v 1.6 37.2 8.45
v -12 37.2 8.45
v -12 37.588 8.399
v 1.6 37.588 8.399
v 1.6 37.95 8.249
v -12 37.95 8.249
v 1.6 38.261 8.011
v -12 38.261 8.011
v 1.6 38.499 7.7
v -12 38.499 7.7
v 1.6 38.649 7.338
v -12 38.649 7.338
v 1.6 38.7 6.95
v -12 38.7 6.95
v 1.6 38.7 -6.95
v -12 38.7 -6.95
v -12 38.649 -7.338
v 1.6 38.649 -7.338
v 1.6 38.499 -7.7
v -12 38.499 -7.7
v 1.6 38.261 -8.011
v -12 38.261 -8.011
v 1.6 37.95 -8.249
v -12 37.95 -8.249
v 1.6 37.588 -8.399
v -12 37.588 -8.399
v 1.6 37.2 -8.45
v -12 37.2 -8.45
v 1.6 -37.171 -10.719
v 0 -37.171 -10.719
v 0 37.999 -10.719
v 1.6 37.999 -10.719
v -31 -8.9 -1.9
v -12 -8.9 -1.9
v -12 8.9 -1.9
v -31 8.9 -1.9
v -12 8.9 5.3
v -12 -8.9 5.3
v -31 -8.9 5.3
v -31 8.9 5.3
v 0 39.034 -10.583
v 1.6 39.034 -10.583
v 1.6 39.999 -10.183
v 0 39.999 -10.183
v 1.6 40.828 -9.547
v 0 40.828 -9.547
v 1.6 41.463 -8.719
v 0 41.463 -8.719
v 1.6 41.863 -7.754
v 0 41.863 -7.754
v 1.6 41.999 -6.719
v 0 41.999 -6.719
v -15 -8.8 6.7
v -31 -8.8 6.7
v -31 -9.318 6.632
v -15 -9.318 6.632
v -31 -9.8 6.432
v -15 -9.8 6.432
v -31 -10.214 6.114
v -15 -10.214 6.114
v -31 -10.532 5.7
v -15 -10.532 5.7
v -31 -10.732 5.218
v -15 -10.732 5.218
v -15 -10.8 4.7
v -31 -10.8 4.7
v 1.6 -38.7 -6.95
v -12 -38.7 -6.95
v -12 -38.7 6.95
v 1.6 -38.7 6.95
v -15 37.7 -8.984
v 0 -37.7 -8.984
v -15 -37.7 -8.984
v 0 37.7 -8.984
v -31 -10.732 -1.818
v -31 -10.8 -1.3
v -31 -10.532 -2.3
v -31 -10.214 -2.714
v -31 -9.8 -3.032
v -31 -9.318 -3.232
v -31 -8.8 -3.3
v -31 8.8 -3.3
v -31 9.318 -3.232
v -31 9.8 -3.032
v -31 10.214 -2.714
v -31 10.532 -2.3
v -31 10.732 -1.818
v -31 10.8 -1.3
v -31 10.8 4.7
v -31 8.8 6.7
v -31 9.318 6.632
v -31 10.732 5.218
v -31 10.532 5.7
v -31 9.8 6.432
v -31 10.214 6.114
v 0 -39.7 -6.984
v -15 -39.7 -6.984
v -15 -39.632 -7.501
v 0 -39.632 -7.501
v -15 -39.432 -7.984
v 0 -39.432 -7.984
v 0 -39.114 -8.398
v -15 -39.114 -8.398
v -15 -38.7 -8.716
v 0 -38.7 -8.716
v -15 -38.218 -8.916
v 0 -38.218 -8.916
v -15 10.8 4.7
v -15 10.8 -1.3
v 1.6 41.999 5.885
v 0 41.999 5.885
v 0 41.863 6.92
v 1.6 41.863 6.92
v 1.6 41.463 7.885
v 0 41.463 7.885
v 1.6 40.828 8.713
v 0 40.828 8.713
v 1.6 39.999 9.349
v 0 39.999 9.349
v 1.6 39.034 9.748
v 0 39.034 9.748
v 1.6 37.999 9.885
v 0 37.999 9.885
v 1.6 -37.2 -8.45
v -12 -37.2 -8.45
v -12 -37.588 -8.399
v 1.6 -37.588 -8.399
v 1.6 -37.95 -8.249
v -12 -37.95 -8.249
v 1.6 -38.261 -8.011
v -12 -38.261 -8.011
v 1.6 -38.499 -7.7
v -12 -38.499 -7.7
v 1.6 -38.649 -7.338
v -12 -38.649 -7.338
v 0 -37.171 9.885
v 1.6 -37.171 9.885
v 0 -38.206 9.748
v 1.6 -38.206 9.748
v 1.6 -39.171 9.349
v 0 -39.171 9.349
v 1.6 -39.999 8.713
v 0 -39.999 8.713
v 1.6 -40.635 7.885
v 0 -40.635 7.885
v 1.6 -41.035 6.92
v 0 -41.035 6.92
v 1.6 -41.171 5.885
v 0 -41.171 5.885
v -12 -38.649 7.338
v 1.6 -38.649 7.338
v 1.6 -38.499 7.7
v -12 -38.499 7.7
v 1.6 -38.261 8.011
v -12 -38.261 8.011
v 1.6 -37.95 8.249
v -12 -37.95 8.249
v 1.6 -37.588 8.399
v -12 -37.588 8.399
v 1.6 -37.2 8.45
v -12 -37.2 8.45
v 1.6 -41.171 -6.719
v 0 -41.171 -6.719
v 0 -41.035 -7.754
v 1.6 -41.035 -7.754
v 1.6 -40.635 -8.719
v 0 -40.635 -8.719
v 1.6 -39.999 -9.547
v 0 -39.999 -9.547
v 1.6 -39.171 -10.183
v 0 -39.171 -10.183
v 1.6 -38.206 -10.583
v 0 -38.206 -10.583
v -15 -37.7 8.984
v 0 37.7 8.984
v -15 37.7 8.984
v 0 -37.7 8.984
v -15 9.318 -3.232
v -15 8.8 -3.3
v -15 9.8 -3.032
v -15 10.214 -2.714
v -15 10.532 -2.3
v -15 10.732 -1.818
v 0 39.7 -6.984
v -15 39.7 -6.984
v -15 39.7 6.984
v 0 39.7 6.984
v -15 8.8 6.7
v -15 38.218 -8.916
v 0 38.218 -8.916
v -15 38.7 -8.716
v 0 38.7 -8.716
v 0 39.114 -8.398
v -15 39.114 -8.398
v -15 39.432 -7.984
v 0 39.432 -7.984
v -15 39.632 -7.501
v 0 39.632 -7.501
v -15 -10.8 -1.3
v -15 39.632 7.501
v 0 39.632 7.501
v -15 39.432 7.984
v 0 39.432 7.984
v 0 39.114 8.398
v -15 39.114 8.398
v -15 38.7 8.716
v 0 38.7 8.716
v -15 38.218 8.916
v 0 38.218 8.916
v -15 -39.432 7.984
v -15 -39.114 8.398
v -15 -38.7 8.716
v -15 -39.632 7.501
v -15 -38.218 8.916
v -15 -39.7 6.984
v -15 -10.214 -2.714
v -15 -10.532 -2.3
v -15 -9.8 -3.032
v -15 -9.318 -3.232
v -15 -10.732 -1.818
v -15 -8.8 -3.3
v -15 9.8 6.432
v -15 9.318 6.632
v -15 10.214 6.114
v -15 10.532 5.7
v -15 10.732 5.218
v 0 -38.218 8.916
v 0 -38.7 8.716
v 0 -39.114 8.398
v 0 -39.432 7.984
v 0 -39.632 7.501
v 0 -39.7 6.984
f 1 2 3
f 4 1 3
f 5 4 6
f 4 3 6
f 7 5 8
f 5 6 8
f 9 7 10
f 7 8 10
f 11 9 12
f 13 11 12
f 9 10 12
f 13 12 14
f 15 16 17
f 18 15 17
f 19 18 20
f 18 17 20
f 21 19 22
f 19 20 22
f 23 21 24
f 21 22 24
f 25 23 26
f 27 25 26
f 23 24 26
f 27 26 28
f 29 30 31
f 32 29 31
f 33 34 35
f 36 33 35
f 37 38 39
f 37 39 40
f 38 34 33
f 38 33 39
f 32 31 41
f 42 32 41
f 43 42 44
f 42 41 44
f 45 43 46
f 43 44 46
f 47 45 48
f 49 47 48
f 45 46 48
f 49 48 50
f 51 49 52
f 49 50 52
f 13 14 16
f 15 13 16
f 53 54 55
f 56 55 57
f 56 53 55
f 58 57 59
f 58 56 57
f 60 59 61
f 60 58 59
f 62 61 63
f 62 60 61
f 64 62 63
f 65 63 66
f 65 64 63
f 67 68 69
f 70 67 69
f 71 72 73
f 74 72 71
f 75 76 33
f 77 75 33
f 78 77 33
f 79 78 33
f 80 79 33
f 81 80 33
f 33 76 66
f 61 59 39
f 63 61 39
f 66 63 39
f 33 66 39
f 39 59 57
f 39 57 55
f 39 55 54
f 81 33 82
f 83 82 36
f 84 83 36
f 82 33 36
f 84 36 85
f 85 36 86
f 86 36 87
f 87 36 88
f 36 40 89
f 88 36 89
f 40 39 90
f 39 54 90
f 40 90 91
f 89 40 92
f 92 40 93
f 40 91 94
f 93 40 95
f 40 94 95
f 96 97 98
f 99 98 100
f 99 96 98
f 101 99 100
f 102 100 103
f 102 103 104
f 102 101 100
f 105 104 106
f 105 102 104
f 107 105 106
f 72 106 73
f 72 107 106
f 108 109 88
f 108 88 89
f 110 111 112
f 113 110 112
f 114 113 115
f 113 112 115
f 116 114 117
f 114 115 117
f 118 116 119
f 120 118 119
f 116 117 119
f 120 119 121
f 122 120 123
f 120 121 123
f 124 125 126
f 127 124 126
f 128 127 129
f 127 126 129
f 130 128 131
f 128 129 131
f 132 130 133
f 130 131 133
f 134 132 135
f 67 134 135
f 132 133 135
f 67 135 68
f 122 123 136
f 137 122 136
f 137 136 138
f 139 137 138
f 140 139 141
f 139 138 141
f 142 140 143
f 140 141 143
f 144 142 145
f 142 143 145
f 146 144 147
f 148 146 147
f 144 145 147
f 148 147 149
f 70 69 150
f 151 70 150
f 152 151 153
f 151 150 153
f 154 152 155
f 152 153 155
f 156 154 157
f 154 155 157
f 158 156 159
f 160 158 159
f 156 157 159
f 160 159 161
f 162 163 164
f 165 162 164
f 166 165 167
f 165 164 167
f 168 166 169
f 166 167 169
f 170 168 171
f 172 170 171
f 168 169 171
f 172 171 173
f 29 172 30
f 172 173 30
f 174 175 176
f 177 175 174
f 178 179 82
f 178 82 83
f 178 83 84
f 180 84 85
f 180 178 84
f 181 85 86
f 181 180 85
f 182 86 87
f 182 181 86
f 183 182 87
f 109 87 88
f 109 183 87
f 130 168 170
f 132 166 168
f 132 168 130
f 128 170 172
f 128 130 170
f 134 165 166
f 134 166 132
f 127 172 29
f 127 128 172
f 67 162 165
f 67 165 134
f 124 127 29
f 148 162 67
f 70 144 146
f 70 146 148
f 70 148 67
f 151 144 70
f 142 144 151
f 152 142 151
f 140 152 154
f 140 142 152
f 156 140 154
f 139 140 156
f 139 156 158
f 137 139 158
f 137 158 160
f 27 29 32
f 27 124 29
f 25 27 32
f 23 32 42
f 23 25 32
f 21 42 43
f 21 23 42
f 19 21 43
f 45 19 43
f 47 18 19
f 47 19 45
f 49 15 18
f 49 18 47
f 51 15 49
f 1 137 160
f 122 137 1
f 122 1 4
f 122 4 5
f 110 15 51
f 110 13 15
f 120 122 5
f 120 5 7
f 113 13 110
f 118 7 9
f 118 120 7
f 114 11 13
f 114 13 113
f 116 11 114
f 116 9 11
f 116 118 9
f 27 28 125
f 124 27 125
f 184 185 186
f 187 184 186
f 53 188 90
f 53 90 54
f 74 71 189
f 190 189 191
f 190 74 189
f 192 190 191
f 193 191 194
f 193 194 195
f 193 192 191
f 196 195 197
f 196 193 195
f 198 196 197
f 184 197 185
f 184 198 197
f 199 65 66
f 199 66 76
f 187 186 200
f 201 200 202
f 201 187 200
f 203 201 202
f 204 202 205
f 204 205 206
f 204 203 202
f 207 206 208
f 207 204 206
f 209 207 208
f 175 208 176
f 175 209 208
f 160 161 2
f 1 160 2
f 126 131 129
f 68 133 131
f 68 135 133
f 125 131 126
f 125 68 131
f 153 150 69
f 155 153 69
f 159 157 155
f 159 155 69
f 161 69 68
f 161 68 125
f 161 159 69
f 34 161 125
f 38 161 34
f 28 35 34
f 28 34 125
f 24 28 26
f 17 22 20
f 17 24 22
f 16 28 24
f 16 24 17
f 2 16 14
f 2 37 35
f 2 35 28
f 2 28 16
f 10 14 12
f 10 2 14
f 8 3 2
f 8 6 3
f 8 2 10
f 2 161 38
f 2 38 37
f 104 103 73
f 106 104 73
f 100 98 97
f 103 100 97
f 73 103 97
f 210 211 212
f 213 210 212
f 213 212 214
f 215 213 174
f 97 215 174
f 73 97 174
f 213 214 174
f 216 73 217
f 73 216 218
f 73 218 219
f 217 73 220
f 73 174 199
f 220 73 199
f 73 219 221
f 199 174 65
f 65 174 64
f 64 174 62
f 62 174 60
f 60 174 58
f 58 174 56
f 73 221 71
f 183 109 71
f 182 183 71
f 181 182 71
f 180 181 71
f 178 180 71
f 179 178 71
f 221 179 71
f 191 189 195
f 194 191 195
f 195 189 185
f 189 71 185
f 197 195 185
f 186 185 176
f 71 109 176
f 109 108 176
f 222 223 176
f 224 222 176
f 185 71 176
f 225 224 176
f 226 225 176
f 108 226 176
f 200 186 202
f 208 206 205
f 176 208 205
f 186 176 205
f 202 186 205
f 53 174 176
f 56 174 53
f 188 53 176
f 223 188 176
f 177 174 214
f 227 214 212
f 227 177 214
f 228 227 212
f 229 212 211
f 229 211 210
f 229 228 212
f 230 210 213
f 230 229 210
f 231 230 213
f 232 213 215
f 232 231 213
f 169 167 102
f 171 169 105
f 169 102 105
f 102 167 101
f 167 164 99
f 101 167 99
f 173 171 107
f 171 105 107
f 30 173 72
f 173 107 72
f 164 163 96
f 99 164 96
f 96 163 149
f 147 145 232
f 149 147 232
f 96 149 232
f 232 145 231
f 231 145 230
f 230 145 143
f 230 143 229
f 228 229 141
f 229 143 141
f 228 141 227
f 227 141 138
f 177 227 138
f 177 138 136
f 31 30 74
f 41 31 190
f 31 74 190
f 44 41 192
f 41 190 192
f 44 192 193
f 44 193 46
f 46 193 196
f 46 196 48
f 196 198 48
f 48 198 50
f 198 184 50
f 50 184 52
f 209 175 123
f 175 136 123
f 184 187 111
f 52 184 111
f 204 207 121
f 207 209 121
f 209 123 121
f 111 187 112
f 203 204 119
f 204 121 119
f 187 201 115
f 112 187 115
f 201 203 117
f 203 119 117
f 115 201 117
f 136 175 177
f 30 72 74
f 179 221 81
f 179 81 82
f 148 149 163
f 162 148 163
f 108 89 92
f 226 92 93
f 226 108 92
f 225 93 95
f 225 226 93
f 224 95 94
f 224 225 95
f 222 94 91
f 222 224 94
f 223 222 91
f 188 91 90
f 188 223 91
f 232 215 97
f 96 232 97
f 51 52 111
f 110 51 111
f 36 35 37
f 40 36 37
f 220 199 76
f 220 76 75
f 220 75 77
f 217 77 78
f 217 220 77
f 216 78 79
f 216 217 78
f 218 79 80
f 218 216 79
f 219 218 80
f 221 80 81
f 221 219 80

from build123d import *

# Parameters (mm, degrees)
F1_DEPTH = 13
F2_DEPTH = 1.6
F3_START = -12
F3_DEPTH = 3
F4_START = -12
F0_W     = 17.8
F0_H     = 7.2
F4_DEPTH = 19


with BuildPart() as f1:
    # F0 (on Right) → F1 (new body)
    with BuildSketch(Plane.YZ):
        with BuildLine():
            Line((37.7, 8.983691223), (-36.7, 8.983691223))
            Line((-36.7, 8.983691223), (-37.7, 8.983691223))
            ThreePointArc((-37.7, 8.983691223), (-39.1142135624, 8.3979047853), (-39.7, 6.983691223))
            Line((-39.7, 6.983691223), (-39.7, 5.983691223))
            Line((-39.7, 5.983691223), (-39.7, -6.983691223))
            ThreePointArc((-39.7, -6.983691223), (-39.1142135624, -8.3979047853), (-37.7, -8.983691223))
            Line((-37.7, -8.983691223), (37.7, -8.983691223))
            ThreePointArc((37.7, -8.983691223), (39.1142135624, -8.3979047853), (39.7, -6.983691223))
            Line((39.7, -6.983691223), (39.7, 6.983691223))
            ThreePointArc((39.7, 6.983691223), (39.1142135624, 8.3979047853), (37.7, 8.983691223))
        make_face()
        with BuildLine():
            Line((37.2, -8.45), (-37.2, -8.45))
            ThreePointArc((-37.2, -8.45), (-38.2606601718, -8.0106601718), (-38.7, -6.95))
            Line((-38.7, -6.95), (-38.7, 6.95))
            ThreePointArc((-38.7, 6.95), (-38.2606601718, 8.0106601718), (-37.2, 8.45))
            Line((-37.2, 8.45), (37.2, 8.45))
            ThreePointArc((37.2, 8.45), (38.2606601718, 8.0106601718), (38.7, 6.95))
            Line((38.7, 6.95), (38.7, -6.95))
            ThreePointArc((38.7, -6.95), (38.2606601718, -8.0106601718), (37.2, -8.45))
        make_face(mode=Mode.SUBTRACT)
    extrude(amount=-F1_DEPTH)

    # F0 (on Right) → F2 (join)
    with BuildSketch(Plane.YZ):
        with BuildLine():
            ThreePointArc((-41.17091404, -6.71898761), (-39.9993411647, -9.5474147347), (-37.17091404, -10.71898761))
            Line((-37.17091404, -10.71898761), (37.99908596, -10.71898761))
            ThreePointArc((37.99908596, -10.71898761), (40.8275130848, -9.5474147347), (41.99908596, -6.71898761))
            Line((41.99908596, -6.71898761), (41.99908596, 5.884703613))
            ThreePointArc((41.99908596, 5.884703613), (40.8275130848, 8.7131307377), (37.99908596, 9.884703613))
            Line((37.99908596, 9.884703613), (-37.17091404, 9.884703613))
            ThreePointArc((-37.17091404, 9.884703613), (-39.9993411647, 8.7131307377), (-41.17091404, 5.884703613))
            Line((-41.17091404, 5.884703613), (-41.17091404, -6.71898761))
        make_face()
        with BuildLine():
            Line((-37.7, 8.983691223), (-36.7, 8.983691223))
            Line((-36.7, 8.983691223), (37.7, 8.983691223))
            ThreePointArc((37.7, 8.983691223), (39.1142135624, 8.3979047853), (39.7, 6.983691223))
            Line((39.7, 6.983691223), (39.7, -6.983691223))
            ThreePointArc((39.7, -6.983691223), (39.1142135624, -8.3979047853), (37.7, -8.983691223))
            Line((37.7, -8.983691223), (-37.7, -8.983691223))
            ThreePointArc((-37.7, -8.983691223), (-39.1142135624, -8.3979047853), (-39.7, -6.983691223))
            Line((-39.7, -6.983691223), (-39.7, 5.983691223))
            Line((-39.7, 5.983691223), (-39.7, 6.983691223))
            ThreePointArc((-39.7, 6.983691223), (-39.1142135624, 8.3979047853), (-37.7, 8.983691223))
        make_face(mode=Mode.SUBTRACT)
        with BuildLine():
            Line((37.7, 8.983691223), (-36.7, 8.983691223))
            Line((-36.7, 8.983691223), (-37.7, 8.983691223))
            ThreePointArc((-37.7, 8.983691223), (-39.1142135624, 8.3979047853), (-39.7, 6.983691223))
            Line((-39.7, 6.983691223), (-39.7, 5.983691223))
            Line((-39.7, 5.983691223), (-39.7, -6.983691223))
            ThreePointArc((-39.7, -6.983691223), (-39.1142135624, -8.3979047853), (-37.7, -8.983691223))
            Line((-37.7, -8.983691223), (37.7, -8.983691223))
            ThreePointArc((37.7, -8.983691223), (39.1142135624, -8.3979047853), (39.7, -6.983691223))
            Line((39.7, -6.983691223), (39.7, 6.983691223))
            ThreePointArc((39.7, 6.983691223), (39.1142135624, 8.3979047853), (37.7, 8.983691223))
        make_face()
        with BuildLine():
            Line((37.2, -8.45), (-37.2, -8.45))
            ThreePointArc((-37.2, -8.45), (-38.2606601718, -8.0106601718), (-38.7, -6.95))
            Line((-38.7, -6.95), (-38.7, 6.95))
            ThreePointArc((-38.7, 6.95), (-38.2606601718, 8.0106601718), (-37.2, 8.45))
            Line((-37.2, 8.45), (37.2, 8.45))
            ThreePointArc((37.2, 8.45), (38.2606601718, 8.0106601718), (38.7, 6.95))
            Line((38.7, 6.95), (38.7, -6.95))
            ThreePointArc((38.7, -6.95), (38.2606601718, -8.0106601718), (37.2, -8.45))
        make_face(mode=Mode.SUBTRACT)
    extrude(amount=F2_DEPTH)

    # F0 (on Right) → F3 (join)
    with BuildSketch(Plane.YZ.offset(F3_START)):
        with BuildLine():
            Line((37.7, 8.983691223), (-36.7, 8.983691223))
            Line((-36.7, 8.983691223), (-37.7, 8.983691223))
            ThreePointArc((-37.7, 8.983691223), (-39.1142135624, 8.3979047853), (-39.7, 6.983691223))
            Line((-39.7, 6.983691223), (-39.7, 5.983691223))
            Line((-39.7, 5.983691223), (-39.7, -6.983691223))
            ThreePointArc((-39.7, -6.983691223), (-39.1142135624, -8.3979047853), (-37.7, -8.983691223))
            Line((-37.7, -8.983691223), (37.7, -8.983691223))
            ThreePointArc((37.7, -8.983691223), (39.1142135624, -8.3979047853), (39.7, -6.983691223))
            Line((39.7, -6.983691223), (39.7, 6.983691223))
            ThreePointArc((39.7, 6.983691223), (39.1142135624, 8.3979047853), (37.7, 8.983691223))
        make_face()
        with BuildLine():
            Line((37.2, -8.45), (-37.2, -8.45))
            ThreePointArc((-37.2, -8.45), (-38.2606601718, -8.0106601718), (-38.7, -6.95))
            Line((-38.7, -6.95), (-38.7, 6.95))
            ThreePointArc((-38.7, 6.95), (-38.2606601718, 8.0106601718), (-37.2, 8.45))
            Line((-37.2, 8.45), (37.2, 8.45))
            ThreePointArc((37.2, 8.45), (38.2606601718, 8.0106601718), (38.7, 6.95))
            Line((38.7, 6.95), (38.7, -6.95))
            ThreePointArc((38.7, -6.95), (38.2606601718, -8.0106601718), (37.2, -8.45))
        make_face(mode=Mode.SUBTRACT)
        with BuildLine():
            ThreePointArc((-38.7, -6.95), (-38.2606601718, -8.0106601718), (-37.2, -8.45))
            Line((-37.2, -8.45), (37.2, -8.45))
            ThreePointArc((37.2, -8.45), (38.2606601718, -8.0106601718), (38.7, -6.95))
            Line((38.7, -6.95), (38.7, 6.95))
            ThreePointArc((38.7, 6.95), (38.2606601718, 8.0106601718), (37.2, 8.45))
            Line((37.2, 8.45), (-37.2, 8.45))
            ThreePointArc((-37.2, 8.45), (-38.2606601718, 8.0106601718), (-38.7, 6.95))
            Line((-38.7, 6.95), (-38.7, -6.95))
        make_face()
        with BuildLine():
            ThreePointArc((10.8, -1.3001189455), (10.2142135624, -2.7143325079), (8.8, -3.3001189455))
            Line((8.8, -3.3001189455), (-8.8, -3.3001189455))
            ThreePointArc((-8.8, -3.3001189455), (-10.2142135624, -2.7143325079), (-10.8, -1.3001189455))
            Line((-10.8, -1.3001189455), (-10.8, 4.6998810545))
            ThreePointArc((-10.8, 4.6998810545), (-10.2142135624, 6.1140946168), (-8.8, 6.6998810545))
            Line((-8.8, 6.6998810545), (8.8, 6.6998810545))
            ThreePointArc((8.8, 6.6998810545), (10.2142135624, 6.1140946168), (10.8, 4.6998810545))
            Line((10.8, 4.6998810545), (10.8, -1.3001189455))
        make_face(mode=Mode.SUBTRACT)
    extrude(amount=-F3_DEPTH)

    # F0 (on Right) → F4 (join)
    with BuildSketch(Plane.YZ.offset(F4_START)):
        with BuildLine():
            Line((-8.8, -3.3001189455), (8.8, -3.3001189455))
            ThreePointArc((8.8, -3.3001189455), (10.2142135624, -2.7143325079), (10.8, -1.3001189455))
            Line((10.8, -1.3001189455), (10.8, 4.6998810545))
            ThreePointArc((10.8, 4.6998810545), (10.2142135624, 6.1140946168), (8.8, 6.6998810545))
            Line((8.8, 6.6998810545), (-8.8, 6.6998810545))
            ThreePointArc((-8.8, 6.6998810545), (-10.2142135624, 6.1140946168), (-10.8, 4.6998810545))
            Line((-10.8, 4.6998810545), (-10.8, -1.3001189455))
            ThreePointArc((-10.8, -1.3001189455), (-10.2142135624, -2.7143325079), (-8.8, -3.3001189455))
        make_face()
        with Locations((0, 1.6998810545)):
            Rectangle(F0_W, F0_H, mode=Mode.SUBTRACT)
    extrude(amount=-F4_DEPTH)


solid = f1.part
